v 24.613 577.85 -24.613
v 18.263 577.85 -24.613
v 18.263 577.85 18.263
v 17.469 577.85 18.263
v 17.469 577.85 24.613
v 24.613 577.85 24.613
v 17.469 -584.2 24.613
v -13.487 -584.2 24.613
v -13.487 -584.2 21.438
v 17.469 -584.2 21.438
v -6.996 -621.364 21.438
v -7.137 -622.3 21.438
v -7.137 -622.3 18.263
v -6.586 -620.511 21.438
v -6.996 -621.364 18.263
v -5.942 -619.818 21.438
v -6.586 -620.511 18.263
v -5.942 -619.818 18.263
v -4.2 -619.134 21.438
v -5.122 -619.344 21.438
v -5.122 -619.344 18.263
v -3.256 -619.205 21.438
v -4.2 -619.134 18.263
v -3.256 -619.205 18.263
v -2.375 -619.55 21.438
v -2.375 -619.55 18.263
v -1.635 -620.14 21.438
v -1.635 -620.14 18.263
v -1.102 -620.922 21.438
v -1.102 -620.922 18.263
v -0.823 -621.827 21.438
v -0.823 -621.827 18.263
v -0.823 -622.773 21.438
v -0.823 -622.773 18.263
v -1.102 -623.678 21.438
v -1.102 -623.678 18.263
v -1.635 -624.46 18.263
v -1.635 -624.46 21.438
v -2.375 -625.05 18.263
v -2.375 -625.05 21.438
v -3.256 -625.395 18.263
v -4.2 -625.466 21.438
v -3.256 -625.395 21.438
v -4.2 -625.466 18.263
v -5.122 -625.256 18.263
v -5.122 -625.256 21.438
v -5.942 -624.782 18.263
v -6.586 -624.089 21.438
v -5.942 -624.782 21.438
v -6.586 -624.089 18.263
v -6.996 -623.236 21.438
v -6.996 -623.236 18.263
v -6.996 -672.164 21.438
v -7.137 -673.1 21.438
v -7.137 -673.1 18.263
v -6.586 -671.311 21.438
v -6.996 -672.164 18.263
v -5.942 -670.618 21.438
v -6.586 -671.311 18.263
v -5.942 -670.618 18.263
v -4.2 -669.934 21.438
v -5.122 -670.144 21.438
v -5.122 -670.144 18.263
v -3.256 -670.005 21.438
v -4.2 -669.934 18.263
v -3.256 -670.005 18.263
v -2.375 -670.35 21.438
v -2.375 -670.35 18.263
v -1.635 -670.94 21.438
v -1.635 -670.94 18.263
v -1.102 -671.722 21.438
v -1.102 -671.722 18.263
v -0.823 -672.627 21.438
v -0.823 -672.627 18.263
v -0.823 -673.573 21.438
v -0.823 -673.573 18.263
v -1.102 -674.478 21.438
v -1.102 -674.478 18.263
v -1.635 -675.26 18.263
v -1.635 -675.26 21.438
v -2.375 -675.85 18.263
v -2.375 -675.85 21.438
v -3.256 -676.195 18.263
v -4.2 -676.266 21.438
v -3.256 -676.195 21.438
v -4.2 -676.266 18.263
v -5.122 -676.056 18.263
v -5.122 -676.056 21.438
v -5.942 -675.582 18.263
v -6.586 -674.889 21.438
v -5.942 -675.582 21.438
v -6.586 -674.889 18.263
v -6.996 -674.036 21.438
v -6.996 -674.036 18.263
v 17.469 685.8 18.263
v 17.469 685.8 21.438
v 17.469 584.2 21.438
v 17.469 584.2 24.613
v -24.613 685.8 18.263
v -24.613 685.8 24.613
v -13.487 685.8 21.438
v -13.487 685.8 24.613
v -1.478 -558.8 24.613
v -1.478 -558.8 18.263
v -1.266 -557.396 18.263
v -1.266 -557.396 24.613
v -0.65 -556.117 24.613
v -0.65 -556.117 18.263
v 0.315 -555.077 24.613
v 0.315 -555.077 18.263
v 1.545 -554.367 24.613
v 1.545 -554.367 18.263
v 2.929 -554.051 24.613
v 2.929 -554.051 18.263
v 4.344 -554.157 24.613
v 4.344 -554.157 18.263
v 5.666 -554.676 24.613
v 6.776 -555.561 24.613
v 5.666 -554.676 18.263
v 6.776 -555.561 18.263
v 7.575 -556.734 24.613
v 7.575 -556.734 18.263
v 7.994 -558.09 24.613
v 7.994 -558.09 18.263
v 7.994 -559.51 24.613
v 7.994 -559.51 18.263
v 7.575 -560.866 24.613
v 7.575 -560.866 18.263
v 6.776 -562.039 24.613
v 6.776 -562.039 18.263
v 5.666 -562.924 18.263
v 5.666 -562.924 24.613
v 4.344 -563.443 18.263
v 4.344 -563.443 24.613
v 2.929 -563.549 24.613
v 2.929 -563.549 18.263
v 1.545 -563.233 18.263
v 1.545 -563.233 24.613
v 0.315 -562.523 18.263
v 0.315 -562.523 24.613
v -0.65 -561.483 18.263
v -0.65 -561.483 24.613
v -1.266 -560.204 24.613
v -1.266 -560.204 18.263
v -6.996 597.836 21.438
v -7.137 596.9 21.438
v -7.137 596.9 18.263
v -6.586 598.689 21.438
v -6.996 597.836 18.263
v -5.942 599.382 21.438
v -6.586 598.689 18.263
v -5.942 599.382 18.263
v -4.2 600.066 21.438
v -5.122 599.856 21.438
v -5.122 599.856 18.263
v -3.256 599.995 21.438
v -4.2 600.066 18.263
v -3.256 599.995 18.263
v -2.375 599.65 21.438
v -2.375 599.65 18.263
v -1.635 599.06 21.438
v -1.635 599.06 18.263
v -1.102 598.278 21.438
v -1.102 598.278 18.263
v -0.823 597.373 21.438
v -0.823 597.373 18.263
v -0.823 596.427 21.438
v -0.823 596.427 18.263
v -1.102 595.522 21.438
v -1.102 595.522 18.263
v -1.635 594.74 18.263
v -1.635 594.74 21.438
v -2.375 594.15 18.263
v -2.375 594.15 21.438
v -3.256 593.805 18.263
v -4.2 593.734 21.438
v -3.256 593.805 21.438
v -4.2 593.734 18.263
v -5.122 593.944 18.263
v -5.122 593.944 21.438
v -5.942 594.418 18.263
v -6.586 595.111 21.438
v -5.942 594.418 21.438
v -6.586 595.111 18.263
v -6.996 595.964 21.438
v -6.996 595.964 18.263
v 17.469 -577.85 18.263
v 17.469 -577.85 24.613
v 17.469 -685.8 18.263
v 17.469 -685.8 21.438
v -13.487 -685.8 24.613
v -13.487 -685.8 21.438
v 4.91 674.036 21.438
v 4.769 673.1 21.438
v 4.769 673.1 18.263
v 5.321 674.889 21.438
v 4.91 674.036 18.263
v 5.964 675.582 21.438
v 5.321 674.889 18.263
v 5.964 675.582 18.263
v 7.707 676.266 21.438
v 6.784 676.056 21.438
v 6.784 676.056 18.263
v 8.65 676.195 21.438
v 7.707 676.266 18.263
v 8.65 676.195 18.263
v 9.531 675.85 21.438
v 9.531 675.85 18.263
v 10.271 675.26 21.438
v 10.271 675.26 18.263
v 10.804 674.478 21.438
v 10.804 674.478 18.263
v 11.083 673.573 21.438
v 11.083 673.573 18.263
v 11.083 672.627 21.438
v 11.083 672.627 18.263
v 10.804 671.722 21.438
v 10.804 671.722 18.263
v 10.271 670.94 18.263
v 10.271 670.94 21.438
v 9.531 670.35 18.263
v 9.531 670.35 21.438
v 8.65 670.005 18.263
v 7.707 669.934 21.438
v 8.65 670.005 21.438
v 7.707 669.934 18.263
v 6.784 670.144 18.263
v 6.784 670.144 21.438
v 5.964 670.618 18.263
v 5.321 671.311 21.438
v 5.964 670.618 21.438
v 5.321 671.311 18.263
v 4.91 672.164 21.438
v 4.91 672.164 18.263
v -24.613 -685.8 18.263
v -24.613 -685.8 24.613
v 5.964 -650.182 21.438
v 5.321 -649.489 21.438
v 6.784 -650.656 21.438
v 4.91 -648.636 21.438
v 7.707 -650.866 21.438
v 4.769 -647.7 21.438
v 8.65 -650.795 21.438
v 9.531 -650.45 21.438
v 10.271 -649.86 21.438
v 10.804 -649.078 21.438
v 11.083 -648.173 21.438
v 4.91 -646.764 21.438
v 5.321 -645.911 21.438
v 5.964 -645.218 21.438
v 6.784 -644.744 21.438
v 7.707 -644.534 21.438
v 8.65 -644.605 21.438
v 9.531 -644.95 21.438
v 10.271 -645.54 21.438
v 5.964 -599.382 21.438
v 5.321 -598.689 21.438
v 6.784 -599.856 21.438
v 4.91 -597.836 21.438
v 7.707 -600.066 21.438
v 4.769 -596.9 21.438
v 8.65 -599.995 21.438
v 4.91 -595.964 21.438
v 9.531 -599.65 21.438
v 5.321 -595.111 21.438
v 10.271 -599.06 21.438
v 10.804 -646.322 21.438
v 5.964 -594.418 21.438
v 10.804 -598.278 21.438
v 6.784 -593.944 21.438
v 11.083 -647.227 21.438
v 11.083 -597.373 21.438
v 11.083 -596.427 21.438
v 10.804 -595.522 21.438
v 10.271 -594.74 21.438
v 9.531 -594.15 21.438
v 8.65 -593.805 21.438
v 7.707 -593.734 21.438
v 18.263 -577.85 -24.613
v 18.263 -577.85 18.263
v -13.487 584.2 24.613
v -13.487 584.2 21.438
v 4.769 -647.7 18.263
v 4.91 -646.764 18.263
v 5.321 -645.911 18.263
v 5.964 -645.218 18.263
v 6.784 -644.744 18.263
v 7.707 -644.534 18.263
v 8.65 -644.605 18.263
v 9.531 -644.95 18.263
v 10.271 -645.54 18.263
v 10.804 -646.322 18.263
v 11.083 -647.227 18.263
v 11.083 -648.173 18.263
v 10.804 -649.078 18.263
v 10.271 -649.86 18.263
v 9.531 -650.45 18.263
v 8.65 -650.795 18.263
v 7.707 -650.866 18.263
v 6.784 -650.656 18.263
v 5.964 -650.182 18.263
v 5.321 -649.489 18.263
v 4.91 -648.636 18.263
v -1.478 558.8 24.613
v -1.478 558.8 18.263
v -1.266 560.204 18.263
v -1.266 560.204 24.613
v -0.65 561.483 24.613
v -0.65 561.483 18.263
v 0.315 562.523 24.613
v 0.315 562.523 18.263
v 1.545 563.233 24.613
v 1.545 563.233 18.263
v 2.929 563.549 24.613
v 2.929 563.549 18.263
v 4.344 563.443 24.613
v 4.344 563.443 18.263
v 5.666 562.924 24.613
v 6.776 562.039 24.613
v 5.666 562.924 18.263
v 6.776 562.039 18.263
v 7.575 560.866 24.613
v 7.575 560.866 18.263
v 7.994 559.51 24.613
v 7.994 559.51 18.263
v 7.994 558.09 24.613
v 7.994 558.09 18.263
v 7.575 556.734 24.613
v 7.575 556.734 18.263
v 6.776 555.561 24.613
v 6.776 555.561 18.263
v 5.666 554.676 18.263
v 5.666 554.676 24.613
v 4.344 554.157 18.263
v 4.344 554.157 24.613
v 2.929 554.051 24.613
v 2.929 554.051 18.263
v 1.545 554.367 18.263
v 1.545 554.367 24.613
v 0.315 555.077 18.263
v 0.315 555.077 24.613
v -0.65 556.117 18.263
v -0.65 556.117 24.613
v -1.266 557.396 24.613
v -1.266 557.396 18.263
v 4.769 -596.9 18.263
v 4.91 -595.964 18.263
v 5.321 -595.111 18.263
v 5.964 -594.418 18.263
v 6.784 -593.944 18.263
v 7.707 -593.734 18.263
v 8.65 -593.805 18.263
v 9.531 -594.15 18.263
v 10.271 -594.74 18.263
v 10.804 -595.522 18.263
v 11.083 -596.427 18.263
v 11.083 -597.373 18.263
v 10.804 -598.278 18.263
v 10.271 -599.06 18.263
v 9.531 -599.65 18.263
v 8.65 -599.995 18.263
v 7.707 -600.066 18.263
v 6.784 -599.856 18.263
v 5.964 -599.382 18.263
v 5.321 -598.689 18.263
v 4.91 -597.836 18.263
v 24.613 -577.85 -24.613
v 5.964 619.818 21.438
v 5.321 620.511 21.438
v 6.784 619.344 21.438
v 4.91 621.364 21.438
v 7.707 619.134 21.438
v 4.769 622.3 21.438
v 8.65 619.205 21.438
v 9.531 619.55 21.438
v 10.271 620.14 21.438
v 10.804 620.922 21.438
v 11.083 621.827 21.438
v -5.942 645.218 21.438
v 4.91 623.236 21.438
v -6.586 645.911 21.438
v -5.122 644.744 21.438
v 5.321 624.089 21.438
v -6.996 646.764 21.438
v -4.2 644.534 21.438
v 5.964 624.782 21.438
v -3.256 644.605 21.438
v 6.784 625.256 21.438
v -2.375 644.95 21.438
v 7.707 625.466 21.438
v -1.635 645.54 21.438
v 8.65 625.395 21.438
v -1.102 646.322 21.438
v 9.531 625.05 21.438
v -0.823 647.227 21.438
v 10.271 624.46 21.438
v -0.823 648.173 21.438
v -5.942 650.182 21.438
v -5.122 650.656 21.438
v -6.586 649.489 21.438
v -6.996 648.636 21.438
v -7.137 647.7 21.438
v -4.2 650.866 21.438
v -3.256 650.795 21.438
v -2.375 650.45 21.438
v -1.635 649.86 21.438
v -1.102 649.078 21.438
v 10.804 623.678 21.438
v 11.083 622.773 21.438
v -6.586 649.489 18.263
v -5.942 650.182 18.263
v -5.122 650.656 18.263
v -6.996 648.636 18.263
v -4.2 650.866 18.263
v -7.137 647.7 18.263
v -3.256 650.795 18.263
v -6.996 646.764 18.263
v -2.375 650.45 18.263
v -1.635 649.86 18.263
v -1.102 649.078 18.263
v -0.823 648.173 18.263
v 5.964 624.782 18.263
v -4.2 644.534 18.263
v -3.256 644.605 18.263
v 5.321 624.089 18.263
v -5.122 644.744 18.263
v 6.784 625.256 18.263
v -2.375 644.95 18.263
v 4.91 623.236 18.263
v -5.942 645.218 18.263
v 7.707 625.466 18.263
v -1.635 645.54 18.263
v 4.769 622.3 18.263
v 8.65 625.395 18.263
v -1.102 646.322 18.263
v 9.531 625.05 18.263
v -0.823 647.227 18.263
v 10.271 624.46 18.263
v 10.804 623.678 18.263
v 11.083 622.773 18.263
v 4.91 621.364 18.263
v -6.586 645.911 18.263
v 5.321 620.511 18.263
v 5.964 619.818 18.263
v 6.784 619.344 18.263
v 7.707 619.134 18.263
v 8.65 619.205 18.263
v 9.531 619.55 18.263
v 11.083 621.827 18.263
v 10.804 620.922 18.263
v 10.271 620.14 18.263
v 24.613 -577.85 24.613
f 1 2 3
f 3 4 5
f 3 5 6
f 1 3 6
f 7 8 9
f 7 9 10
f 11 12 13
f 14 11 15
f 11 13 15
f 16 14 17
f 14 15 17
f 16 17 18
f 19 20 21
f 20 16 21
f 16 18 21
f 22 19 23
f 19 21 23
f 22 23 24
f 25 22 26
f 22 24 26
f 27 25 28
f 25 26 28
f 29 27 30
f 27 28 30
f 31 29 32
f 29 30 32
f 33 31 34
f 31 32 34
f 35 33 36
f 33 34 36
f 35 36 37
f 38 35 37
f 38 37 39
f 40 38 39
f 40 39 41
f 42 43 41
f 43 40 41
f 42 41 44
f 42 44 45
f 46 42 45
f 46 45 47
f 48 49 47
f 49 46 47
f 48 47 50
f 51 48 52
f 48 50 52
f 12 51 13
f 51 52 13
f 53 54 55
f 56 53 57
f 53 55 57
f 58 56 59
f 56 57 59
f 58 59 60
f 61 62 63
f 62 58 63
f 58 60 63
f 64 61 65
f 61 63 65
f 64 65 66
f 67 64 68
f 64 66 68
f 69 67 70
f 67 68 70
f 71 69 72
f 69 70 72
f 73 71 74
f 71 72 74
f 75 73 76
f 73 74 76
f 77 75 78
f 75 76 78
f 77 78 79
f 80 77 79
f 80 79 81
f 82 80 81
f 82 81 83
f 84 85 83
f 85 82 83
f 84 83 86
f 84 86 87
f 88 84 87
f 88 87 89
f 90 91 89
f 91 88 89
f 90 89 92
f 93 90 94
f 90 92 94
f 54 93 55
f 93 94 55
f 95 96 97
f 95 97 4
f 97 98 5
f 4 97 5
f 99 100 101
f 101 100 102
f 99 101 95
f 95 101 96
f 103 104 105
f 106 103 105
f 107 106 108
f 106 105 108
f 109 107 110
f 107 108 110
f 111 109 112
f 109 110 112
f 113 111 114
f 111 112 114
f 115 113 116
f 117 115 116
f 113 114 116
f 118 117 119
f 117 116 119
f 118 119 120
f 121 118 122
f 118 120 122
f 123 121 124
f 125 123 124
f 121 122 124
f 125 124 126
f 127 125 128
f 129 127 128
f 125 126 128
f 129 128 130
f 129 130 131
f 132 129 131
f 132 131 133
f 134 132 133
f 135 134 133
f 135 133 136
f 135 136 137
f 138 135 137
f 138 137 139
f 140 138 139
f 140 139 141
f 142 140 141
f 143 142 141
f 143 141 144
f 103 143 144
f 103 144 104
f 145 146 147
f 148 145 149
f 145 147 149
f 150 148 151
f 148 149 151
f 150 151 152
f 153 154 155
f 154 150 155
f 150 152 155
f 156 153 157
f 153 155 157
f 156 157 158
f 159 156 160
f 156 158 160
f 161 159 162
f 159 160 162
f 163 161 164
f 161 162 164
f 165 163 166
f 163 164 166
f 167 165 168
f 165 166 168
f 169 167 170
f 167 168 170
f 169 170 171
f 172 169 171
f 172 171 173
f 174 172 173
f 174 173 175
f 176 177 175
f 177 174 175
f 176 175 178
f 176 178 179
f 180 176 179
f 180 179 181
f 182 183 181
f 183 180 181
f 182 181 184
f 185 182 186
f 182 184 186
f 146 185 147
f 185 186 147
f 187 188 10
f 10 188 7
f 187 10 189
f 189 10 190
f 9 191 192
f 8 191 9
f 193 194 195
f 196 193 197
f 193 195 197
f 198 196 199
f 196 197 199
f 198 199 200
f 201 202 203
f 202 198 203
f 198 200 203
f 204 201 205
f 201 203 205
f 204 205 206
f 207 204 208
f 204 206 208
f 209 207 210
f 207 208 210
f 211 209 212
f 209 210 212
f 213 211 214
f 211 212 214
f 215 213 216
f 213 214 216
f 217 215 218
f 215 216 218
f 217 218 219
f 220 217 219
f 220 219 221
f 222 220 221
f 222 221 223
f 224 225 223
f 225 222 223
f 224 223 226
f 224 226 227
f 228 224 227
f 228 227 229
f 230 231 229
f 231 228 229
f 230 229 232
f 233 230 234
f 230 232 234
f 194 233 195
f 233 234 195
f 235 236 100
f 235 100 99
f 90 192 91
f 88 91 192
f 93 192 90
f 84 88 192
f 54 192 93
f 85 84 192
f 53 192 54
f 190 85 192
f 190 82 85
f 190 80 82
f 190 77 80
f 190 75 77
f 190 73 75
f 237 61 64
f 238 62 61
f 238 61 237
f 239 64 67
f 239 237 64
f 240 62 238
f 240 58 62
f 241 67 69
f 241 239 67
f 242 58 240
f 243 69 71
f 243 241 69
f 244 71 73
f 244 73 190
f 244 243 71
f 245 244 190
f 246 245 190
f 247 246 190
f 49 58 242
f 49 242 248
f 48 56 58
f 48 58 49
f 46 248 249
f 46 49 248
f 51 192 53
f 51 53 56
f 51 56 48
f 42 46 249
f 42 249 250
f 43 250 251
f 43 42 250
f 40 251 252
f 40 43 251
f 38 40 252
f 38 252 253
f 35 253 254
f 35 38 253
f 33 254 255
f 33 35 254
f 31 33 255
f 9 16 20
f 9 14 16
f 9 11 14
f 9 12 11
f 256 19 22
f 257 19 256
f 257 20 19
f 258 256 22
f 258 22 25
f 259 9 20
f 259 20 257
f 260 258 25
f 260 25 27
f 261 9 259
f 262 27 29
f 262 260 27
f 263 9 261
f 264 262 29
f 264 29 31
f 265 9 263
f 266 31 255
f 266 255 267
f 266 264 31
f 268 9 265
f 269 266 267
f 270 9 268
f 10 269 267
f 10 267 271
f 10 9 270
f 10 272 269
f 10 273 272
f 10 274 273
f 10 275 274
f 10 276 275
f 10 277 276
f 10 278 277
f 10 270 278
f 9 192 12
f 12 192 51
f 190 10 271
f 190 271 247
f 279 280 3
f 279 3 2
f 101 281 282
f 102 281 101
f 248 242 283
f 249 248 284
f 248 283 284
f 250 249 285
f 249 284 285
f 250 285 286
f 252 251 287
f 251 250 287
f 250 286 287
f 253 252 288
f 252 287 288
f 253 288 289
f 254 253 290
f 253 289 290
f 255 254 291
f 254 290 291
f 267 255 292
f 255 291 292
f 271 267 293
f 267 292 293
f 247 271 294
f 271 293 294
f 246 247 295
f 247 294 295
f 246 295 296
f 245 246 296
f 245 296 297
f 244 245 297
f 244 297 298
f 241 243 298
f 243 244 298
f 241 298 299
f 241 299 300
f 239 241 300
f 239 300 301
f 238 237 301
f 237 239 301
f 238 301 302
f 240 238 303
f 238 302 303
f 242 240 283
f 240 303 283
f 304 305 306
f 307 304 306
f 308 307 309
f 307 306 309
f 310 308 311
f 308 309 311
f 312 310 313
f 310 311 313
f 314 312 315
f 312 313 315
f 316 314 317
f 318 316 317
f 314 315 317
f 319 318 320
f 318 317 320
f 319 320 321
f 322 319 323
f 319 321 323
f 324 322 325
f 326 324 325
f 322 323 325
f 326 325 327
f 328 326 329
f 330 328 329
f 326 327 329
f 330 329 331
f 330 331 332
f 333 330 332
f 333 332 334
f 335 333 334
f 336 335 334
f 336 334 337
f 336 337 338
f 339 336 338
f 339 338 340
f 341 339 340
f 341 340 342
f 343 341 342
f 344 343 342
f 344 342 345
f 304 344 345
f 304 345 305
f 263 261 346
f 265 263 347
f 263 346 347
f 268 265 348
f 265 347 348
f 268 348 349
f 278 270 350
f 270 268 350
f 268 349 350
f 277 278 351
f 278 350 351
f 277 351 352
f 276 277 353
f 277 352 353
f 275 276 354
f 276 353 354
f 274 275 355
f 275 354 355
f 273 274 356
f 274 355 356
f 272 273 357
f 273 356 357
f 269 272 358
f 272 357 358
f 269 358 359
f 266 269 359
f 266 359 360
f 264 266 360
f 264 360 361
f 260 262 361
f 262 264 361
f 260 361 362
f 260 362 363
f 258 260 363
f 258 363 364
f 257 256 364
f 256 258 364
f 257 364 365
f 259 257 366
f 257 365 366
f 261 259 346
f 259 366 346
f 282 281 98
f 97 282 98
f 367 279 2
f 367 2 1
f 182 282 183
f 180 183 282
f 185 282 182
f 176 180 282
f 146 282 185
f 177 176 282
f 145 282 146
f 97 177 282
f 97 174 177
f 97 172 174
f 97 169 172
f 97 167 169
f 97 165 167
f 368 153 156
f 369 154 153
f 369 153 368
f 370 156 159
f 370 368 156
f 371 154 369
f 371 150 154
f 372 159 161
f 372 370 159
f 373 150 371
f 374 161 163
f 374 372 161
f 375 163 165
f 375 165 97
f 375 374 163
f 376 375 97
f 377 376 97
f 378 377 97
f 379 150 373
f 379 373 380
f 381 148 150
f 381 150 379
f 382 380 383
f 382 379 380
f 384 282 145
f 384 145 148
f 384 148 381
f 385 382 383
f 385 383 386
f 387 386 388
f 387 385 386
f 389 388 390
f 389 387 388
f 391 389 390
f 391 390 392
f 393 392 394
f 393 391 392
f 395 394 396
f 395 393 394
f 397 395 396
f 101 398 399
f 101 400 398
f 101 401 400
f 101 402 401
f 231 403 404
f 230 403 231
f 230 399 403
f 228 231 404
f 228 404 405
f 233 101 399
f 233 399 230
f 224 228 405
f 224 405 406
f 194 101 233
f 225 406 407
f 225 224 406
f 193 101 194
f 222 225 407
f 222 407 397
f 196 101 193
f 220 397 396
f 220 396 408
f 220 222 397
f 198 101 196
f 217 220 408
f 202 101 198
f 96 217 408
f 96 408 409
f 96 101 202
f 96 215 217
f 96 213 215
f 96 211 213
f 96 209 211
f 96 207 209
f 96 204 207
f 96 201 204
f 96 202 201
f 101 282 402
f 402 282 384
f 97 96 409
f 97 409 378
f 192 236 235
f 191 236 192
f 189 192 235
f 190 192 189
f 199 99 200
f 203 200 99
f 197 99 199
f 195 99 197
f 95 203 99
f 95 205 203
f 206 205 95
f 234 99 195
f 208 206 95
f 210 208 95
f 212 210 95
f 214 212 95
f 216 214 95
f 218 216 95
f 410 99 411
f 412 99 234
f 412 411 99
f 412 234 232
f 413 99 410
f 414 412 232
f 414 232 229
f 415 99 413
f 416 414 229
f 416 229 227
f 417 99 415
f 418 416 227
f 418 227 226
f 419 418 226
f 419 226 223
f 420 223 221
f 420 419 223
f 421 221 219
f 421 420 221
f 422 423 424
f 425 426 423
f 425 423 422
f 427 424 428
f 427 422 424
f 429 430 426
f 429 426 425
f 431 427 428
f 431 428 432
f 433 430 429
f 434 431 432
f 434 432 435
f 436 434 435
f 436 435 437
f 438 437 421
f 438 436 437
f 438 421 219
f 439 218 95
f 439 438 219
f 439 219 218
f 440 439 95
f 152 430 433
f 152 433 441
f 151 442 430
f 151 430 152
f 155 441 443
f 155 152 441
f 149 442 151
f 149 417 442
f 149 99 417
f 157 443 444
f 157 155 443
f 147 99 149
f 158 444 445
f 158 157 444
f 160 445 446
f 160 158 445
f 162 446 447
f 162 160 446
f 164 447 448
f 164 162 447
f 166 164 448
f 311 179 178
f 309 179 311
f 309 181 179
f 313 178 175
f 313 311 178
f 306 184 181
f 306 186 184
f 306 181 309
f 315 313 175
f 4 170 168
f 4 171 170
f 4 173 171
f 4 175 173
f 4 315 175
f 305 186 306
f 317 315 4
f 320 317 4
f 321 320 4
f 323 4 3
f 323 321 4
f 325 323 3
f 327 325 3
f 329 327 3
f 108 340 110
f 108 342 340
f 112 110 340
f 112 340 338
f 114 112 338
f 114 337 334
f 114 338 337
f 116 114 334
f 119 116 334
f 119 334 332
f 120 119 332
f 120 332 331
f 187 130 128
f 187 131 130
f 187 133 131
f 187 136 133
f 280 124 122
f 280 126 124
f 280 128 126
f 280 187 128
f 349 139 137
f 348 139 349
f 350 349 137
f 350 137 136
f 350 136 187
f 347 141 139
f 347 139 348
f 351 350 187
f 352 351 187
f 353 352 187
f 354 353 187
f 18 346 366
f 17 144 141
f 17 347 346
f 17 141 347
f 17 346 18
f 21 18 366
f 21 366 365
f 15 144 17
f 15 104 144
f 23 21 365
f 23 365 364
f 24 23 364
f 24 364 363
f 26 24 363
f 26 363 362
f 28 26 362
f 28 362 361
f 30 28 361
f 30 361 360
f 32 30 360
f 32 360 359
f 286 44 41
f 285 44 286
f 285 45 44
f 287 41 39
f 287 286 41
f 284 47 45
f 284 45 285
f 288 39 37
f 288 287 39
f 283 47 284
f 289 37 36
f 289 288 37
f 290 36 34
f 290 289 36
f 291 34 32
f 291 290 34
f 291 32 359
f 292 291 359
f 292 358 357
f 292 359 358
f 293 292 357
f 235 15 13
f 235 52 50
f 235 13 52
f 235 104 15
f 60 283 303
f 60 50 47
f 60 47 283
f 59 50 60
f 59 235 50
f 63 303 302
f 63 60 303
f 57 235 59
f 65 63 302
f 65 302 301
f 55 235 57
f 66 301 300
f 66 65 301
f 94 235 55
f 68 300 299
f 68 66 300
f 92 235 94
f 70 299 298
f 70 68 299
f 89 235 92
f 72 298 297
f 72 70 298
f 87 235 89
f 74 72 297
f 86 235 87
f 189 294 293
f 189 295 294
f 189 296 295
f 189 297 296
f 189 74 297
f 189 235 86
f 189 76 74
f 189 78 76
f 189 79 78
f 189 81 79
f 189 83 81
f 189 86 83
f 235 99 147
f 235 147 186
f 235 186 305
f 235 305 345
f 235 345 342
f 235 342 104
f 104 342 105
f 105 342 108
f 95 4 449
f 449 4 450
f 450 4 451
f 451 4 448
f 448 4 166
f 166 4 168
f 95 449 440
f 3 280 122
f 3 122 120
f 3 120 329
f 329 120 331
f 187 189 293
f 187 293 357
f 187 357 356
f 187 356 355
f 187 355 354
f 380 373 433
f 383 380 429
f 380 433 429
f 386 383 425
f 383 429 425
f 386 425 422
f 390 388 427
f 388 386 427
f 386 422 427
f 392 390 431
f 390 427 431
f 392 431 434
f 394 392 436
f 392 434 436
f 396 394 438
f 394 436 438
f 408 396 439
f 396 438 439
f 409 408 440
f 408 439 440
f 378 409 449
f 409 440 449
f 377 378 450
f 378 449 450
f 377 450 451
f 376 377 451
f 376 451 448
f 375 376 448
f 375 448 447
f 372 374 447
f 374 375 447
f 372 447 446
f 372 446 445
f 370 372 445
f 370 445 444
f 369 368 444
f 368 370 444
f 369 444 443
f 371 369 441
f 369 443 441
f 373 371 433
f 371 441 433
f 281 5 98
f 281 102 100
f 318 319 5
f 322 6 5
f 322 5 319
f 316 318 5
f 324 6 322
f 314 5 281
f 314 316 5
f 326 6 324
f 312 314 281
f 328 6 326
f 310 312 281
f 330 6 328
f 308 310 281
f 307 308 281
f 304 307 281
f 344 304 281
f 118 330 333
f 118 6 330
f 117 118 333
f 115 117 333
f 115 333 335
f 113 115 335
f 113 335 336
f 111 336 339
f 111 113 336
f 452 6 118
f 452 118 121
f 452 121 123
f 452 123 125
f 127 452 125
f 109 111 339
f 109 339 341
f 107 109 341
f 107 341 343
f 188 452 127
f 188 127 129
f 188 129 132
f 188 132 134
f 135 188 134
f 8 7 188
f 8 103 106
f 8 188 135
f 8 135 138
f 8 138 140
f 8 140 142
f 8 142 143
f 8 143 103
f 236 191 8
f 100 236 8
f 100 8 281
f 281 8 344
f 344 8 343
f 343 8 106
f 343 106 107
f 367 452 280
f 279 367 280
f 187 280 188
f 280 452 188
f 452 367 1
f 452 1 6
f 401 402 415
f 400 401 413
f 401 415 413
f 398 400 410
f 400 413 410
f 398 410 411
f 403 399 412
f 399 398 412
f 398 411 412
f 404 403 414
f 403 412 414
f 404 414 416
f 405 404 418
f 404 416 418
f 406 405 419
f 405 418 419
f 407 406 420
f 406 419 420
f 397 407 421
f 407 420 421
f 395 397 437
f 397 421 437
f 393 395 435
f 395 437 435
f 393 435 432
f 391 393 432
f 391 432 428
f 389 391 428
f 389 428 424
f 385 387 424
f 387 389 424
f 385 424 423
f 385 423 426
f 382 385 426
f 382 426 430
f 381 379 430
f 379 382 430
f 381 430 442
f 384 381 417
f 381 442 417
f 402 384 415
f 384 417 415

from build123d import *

# Parameters (mm, degrees)
F1_DEPTH = 685.8
F2_W     = 30.95625
F2_H     = 101.6
F2_R     = 3.175
F3_DEPTH = 3.175
F4_DEPTH = 49.2262
F5_D     = 6.35
F7_D     = 9.525


with BuildPart() as f1:
    # F0 (on Front) → F1 (new body, symmetric)
    with BuildSketch(Plane.XZ):
        Polygon((18.2626, -24.6126), (24.6126, -24.6126), (24.6126, 24.6126), (-24.6126, 24.6126), (-24.6126, 18.2626), (18.2626, 18.2626), align=None)
    extrude(amount=F1_DEPTH, both=True)

    # F2 (on face) → F3 (cut)
    with BuildSketch(Plane.XY.offset(24.6126)):
        with Locations((1.990725, -635)):
            Rectangle(F2_W, F2_H)
        with Locations((-3.9624, -673.1)):
            Circle(F2_R, mode=Mode.SUBTRACT)
        with Locations((-3.9624, -622.3)):
            Circle(F2_R, mode=Mode.SUBTRACT)
        with Locations((7.94385, -647.7)):
            Circle(F2_R, mode=Mode.SUBTRACT)
        with Locations((7.94385, -596.9)):
            Circle(F2_R, mode=Mode.SUBTRACT)
        with Locations((1.990725, 635)):
            Rectangle(F2_W, F2_H)
        with Locations((-3.9624, 596.9)):
            Circle(F2_R, mode=Mode.SUBTRACT)
        with Locations((-3.9624, 647.7)):
            Circle(F2_R, mode=Mode.SUBTRACT)
        with Locations((7.94385, 622.3)):
            Circle(F2_R, mode=Mode.SUBTRACT)
        with Locations((7.94385, 673.1)):
            Circle(F2_R, mode=Mode.SUBTRACT)
    extrude(amount=-F3_DEPTH, mode=Mode.SUBTRACT)

    # F2 (on face) → F4 (cut, through all)
    with BuildSketch(Plane.XY.offset(24.6126)):
        Polygon((17.46885, 577.85), (24.6126, 577.85), (24.6126, 685.8), (17.46885, 685.8), (17.46885, 584.2), align=None)
        Polygon((17.46885, -685.8), (24.6126, -685.8), (24.6126, -577.85), (17.46885, -577.85), (17.46885, -584.2), align=None)
    extrude(amount=-F4_DEPTH, mode=Mode.SUBTRACT)

    # F5 (through all)
    with Locations(Plane.XY.offset(24.6126)):
        with Locations((7.94385, -647.7), (-3.9624, -673.1), (-3.9624, -622.3), (7.94385, -596.9), (-3.9624, 647.7), (7.94385, 673.1), (7.94385, 622.3), (-3.9624, 596.9)):
            Hole(F5_D / 2)

    # F7 (through all)
    with Locations(Plane.XY.offset(24.6126)):
        with Locations((3.284499, -558.8), (3.284499, 558.8)):
            Hole(F7_D / 2)


solid = f1.part
